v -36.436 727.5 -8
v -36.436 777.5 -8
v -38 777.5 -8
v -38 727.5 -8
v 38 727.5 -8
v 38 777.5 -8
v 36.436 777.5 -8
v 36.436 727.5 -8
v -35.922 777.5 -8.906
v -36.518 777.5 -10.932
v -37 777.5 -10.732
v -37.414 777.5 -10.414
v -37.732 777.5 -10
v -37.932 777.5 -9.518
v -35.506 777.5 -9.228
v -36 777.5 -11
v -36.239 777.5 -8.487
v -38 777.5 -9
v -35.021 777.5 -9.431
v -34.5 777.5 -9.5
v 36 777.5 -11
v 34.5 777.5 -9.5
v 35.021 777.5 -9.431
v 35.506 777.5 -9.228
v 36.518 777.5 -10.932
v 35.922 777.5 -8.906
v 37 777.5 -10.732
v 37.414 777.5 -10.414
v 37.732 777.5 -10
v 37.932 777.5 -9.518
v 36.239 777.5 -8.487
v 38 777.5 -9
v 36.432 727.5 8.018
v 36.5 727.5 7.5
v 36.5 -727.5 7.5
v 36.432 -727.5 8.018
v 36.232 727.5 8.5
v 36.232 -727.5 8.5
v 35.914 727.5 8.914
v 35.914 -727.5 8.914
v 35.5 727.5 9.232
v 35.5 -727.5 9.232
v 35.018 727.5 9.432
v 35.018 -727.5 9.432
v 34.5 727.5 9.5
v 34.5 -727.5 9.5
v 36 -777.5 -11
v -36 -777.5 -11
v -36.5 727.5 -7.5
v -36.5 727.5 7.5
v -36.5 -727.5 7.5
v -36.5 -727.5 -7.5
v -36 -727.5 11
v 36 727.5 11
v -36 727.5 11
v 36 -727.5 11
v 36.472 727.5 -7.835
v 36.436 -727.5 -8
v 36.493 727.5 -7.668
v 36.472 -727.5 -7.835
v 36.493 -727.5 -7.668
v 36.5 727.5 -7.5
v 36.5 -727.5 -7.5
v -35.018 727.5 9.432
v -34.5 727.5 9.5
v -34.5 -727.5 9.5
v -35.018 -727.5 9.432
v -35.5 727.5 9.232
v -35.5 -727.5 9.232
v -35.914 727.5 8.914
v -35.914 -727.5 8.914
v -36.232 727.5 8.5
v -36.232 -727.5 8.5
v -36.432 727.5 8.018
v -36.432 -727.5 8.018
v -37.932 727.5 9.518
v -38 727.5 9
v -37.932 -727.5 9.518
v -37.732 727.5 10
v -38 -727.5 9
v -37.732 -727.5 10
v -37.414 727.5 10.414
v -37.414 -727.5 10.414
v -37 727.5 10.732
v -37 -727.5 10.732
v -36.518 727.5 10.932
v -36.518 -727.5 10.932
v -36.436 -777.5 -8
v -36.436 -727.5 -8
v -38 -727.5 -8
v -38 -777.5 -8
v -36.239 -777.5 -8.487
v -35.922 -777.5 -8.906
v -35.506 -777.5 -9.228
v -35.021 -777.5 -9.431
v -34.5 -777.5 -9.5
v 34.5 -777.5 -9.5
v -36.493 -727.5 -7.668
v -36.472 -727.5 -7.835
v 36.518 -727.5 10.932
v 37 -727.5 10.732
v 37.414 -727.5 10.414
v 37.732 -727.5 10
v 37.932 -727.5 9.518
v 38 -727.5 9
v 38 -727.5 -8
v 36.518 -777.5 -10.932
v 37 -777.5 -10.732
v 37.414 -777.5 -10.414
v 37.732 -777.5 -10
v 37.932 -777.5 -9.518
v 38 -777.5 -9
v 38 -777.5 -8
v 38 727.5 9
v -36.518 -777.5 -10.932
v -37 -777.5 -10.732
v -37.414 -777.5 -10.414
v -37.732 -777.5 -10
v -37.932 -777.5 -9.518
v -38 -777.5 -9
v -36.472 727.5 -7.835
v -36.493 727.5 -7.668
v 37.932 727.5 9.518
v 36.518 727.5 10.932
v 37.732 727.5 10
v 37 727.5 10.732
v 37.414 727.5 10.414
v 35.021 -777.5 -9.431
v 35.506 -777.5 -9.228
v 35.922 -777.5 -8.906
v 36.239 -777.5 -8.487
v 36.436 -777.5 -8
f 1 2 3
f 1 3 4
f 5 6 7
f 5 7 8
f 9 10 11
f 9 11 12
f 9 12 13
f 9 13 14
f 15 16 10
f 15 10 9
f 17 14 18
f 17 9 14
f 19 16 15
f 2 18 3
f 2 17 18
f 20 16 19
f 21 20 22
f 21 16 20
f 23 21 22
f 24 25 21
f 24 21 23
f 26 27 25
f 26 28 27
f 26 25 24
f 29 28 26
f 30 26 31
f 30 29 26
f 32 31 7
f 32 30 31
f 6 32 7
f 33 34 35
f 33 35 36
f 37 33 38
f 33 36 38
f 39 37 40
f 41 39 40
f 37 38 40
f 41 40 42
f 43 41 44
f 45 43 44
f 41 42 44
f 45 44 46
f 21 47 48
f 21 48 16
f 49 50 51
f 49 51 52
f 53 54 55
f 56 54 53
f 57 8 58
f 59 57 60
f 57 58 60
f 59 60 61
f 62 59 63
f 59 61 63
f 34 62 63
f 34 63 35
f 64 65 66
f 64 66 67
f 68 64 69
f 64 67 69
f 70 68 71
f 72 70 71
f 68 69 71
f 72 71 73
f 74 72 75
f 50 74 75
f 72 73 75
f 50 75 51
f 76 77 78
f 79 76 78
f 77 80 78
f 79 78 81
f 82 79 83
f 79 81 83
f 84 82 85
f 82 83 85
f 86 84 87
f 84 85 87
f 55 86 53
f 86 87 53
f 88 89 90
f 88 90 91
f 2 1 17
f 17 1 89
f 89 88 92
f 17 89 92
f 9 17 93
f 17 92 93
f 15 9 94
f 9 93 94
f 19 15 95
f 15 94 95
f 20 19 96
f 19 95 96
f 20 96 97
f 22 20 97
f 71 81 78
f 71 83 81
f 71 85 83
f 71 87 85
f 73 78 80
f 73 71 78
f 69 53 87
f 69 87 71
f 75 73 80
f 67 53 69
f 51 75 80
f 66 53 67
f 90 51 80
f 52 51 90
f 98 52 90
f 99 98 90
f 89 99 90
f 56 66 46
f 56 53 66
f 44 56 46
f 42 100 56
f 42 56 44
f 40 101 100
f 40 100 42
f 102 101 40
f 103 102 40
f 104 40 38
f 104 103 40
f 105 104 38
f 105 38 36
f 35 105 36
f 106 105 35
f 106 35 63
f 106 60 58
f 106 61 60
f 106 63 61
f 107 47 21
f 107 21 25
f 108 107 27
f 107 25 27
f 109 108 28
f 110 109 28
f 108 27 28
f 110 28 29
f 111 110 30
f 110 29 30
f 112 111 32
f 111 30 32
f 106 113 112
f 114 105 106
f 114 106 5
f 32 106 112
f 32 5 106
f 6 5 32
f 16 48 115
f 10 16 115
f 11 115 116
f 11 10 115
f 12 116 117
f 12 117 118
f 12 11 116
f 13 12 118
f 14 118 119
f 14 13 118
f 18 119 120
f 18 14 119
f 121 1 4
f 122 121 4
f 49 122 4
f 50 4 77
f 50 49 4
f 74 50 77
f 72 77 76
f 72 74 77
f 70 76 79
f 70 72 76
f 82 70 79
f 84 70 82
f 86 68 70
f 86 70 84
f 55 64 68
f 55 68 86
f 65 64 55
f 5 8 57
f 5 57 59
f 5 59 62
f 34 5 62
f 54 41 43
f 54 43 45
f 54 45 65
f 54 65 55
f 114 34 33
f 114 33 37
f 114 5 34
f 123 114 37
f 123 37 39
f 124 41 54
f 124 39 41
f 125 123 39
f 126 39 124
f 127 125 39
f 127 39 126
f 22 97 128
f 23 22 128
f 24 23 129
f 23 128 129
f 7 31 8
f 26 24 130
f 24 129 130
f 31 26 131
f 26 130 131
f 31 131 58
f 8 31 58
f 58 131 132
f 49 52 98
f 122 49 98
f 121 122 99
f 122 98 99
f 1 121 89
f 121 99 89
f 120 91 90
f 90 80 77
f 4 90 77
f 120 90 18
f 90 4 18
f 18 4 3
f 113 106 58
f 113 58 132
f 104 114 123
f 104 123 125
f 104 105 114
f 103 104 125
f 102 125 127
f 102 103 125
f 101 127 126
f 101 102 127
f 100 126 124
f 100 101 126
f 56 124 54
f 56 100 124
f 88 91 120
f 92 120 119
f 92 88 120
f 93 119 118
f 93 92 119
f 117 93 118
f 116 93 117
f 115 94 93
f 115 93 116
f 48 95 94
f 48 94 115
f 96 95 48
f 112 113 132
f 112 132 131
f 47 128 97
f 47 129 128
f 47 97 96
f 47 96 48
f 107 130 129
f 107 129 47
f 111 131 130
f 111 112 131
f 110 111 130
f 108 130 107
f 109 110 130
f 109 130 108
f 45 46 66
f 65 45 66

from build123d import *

# Parameters (mm, degrees)
F1_DEPTH      = 38
F1_DEPTH_BACK = 38
F3_DEPTH      = 1555.001
F4_R          = 2


with BuildPart() as f1:
    # F0 (on Right) → F1 (new body, two sides)
    with BuildSketch(Plane.YZ) as f1_sk:
        Polygon((-777.5, -11), (777.5, -11), (777.5, -8), (727.5, -8), (727.5, 11), (-727.5, 11), (-727.5, -8), (-777.5, -8), align=None)
    extrude(amount=F1_DEPTH)
    extrude(f1_sk.sketch, amount=-F1_DEPTH_BACK)

    # F2 (on face) → F3 (cut, through all)
    with BuildSketch(Plane.XZ.offset(777.5)):
        with BuildLine():
            Line((-36.4364916731, -8), (36.4364916731, -8))
            ThreePointArc((36.4364916731, -8), (36.4840593925, -7.752008585), (36.5, -7.5))
            Line((36.5, -7.5), (36.5, 7.5))
            ThreePointArc((36.5, 7.5), (35.9142135624, 8.9142135624), (34.5, 9.5))
            Line((34.5, 9.5), (-34.5, 9.5))
            ThreePointArc((-34.5, 9.5), (-35.9142135624, 8.9142135624), (-36.5, 7.5))
            Line((-36.5, 7.5), (-36.5, -7.5))
            ThreePointArc((-36.5, -7.5), (-36.4840593925, -7.752008585), (-36.4364916731, -8))
        make_face()
        with BuildLine():
            Line((-34.5, -9.5), (34.5, -9.5))
            ThreePointArc((34.5, -9.5), (35.7247448714, -9.0811388301), (36.4364916731, -8))
            Line((36.4364916731, -8), (-36.4364916731, -8))
            ThreePointArc((-36.4364916731, -8), (-35.7247448714, -9.0811388301), (-34.5, -9.5))
        make_face()
    extrude(amount=-F3_DEPTH, mode=Mode.SUBTRACT)

    # F4
    f4_edges = [f1.edges().sort_by_distance(p)[0] for p in [
        (-38, 0, 11),
        (-38, 0, -11),
        (38, 0, -11),
        (38, 0, 11),
    ]]
    fillet(f4_edges, radius=F4_R)


solid = f1.part
